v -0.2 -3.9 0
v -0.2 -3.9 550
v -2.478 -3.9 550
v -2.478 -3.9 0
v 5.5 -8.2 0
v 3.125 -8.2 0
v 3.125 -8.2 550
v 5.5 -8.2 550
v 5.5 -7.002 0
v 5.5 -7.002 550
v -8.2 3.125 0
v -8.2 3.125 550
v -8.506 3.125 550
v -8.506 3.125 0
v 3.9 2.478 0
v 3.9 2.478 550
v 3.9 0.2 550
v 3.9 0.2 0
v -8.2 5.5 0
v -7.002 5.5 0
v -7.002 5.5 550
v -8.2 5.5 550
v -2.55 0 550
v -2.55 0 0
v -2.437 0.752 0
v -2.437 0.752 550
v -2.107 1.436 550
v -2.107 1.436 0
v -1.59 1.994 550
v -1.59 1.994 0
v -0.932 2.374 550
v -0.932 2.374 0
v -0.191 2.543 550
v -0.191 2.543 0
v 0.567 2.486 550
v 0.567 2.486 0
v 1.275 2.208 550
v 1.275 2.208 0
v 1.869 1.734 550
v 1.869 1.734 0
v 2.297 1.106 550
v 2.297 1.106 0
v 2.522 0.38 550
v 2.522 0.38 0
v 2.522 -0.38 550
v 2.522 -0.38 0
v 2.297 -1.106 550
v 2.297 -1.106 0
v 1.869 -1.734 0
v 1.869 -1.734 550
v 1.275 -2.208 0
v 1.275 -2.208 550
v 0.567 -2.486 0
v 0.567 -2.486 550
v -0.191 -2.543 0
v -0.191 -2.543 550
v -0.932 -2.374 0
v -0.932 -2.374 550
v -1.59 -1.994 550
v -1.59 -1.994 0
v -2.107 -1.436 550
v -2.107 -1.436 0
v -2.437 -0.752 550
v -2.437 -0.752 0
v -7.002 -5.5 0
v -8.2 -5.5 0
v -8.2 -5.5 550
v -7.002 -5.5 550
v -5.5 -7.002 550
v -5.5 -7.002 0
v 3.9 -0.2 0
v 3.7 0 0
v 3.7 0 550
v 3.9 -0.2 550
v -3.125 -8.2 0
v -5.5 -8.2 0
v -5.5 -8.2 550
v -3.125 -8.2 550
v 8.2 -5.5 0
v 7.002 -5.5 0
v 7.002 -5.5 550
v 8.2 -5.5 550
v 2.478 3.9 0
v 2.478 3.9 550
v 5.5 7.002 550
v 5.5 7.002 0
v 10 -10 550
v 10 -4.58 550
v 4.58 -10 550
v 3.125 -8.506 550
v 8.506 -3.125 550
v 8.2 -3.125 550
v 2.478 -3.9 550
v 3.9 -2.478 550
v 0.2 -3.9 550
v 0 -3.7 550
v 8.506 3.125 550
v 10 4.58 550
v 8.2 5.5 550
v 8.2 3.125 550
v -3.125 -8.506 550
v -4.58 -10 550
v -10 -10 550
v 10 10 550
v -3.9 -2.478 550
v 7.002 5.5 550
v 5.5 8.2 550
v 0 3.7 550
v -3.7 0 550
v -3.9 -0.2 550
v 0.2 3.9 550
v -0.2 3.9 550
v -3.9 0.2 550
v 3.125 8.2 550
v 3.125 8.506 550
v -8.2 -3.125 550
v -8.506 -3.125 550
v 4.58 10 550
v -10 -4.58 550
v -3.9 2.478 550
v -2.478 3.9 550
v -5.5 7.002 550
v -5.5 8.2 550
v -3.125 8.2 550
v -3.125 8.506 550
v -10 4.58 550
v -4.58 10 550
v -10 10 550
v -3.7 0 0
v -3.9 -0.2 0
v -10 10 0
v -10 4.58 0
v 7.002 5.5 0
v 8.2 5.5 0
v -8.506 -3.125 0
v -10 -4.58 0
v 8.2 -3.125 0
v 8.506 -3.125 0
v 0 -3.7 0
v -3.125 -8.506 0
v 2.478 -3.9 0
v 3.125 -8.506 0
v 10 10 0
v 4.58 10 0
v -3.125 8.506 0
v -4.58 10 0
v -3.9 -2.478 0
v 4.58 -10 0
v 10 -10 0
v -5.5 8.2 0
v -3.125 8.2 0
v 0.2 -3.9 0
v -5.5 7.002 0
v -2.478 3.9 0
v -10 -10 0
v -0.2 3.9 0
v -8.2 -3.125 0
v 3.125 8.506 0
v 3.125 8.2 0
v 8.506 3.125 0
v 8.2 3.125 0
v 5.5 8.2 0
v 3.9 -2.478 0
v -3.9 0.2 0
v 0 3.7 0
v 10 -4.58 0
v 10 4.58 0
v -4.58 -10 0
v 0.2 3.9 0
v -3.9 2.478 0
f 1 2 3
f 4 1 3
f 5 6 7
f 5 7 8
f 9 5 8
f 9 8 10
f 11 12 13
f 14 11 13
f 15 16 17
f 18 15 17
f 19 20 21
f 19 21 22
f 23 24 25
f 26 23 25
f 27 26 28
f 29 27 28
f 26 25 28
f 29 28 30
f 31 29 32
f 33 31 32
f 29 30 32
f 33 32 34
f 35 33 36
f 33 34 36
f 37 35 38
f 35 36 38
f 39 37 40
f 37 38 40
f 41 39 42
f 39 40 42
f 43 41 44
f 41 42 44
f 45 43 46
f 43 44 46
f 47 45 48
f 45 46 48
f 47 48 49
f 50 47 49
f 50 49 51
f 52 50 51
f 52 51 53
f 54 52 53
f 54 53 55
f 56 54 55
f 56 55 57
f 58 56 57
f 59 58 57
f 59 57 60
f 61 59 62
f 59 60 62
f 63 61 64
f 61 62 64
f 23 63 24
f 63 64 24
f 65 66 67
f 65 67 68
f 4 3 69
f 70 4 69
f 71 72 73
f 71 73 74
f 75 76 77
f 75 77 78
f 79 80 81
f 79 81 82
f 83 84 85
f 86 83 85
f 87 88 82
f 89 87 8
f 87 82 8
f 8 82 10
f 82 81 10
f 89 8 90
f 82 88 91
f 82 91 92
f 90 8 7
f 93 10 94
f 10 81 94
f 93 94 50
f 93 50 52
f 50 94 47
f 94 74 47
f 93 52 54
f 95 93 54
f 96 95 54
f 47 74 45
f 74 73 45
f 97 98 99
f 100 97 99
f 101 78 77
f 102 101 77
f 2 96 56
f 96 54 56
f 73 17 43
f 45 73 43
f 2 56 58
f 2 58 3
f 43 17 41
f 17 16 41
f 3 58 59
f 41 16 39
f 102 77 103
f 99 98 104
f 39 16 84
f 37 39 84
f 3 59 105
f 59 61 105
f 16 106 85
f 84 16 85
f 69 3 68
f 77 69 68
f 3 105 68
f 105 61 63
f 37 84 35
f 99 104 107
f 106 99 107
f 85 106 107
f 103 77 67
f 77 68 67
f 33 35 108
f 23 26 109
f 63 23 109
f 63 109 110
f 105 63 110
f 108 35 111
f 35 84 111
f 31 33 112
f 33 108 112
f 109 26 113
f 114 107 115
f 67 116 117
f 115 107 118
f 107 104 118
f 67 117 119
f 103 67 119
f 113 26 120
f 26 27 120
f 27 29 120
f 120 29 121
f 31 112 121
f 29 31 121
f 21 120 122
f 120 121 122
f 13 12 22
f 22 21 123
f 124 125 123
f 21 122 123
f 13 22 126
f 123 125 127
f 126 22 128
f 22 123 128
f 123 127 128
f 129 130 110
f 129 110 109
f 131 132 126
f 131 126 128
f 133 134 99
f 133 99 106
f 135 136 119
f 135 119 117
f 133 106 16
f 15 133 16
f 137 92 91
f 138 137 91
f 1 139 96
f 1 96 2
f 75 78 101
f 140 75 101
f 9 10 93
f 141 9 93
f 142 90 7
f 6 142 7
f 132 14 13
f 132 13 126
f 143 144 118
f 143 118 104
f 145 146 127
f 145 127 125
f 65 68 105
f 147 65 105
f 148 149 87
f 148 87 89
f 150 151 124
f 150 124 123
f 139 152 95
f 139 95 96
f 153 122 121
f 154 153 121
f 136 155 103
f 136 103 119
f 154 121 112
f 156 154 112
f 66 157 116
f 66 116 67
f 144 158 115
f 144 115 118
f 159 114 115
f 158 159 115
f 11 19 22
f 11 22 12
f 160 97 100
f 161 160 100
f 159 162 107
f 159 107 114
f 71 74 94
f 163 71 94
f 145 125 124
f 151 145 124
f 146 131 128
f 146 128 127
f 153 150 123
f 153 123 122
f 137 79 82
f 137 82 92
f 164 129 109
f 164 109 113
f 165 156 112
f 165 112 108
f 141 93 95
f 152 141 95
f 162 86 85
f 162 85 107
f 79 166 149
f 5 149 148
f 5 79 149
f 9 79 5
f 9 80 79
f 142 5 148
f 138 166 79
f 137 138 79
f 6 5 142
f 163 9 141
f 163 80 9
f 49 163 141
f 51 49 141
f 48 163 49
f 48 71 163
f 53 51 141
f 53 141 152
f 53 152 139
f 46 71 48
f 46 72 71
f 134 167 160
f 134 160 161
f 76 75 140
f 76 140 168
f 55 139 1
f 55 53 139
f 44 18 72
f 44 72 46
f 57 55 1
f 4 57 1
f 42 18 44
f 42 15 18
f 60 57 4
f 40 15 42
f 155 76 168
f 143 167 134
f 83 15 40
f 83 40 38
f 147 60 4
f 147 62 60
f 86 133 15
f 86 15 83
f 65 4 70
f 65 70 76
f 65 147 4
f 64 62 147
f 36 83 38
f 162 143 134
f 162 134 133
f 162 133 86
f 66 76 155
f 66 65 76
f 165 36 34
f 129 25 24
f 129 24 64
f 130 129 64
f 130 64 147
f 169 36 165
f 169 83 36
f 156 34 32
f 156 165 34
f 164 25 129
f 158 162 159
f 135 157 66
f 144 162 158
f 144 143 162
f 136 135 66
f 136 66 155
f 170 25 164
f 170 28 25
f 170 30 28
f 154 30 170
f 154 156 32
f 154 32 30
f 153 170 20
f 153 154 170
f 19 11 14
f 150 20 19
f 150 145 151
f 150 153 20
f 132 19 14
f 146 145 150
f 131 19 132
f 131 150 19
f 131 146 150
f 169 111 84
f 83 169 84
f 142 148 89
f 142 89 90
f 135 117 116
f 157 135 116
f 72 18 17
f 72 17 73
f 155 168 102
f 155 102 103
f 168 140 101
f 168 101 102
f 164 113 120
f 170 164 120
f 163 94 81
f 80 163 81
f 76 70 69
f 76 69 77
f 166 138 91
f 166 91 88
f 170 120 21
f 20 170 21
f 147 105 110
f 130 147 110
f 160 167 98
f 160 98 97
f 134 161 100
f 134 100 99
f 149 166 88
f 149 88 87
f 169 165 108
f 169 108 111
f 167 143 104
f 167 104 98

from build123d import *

# Parameters (mm, degrees)
SKETCH_1_R      = 2.55
EXTRUDE_1_DEPTH = 550


with BuildPart() as part:
    # Эскиз1 → Бобышка-Вытянуть1 (new body)
    with BuildSketch(Plane(origin=(0, 0, 0), x_dir=(-1, 0, 0), z_dir=(0, 0, -1))):
        Polygon((0, -3.7), (0.2, -3.9), (2.478143526, -3.9), (5.5, -7.00202244), (5.5, -8.2), (3.125, -8.2), (3.125, -8.506400721), (4.58, -10), (10, -10), (10, -4.58), (8.506400721, -3.125), (8.2, -3.125), (8.2, -5.5), (7.00202244, -5.5), (3.9, -2.478143526), (3.9, -0.2), (3.7, 0), (3.9, 0.2), (3.9, 2.478143526), (7.00202244, 5.5), (8.2, 5.5), (8.2, 3.125), (8.506400721, 3.125), (10, 4.58), (10, 10), (4.58, 10), (3.125, 8.506400721), (3.125, 8.2), (5.5, 8.2), (5.5, 7.00202244), (2.478143526, 3.9), (0.2, 3.9), (0, 3.7), (-0.2, 3.9), (-2.478143526, 3.9), (-5.5, 7.00202244), (-5.5, 8.2), (-3.125, 8.2), (-3.125, 8.506400721), (-4.58, 10), (-10, 10), (-10, 4.58), (-8.506400721, 3.125), (-8.2, 3.125), (-8.2, 5.5), (-7.00202244, 5.5), (-3.9, 2.478143526), (-3.9, 0.2), (-3.7, 0), (-3.9, -0.2), (-3.9, -2.478143526), (-7.00202244, -5.5), (-8.2, -5.5), (-8.2, -3.125), (-8.506400721, -3.125), (-10, -4.58), (-10, -10), (-4.58, -10), (-3.125, -8.506400721), (-3.125, -8.2), (-5.5, -8.2), (-5.5, -7.00202244), (-2.478143526, -3.9), (-0.2, -3.9), align=None)
        Circle(SKETCH_1_R, mode=Mode.SUBTRACT)
    extrude(amount=-EXTRUDE_1_DEPTH)


solid = part.part
